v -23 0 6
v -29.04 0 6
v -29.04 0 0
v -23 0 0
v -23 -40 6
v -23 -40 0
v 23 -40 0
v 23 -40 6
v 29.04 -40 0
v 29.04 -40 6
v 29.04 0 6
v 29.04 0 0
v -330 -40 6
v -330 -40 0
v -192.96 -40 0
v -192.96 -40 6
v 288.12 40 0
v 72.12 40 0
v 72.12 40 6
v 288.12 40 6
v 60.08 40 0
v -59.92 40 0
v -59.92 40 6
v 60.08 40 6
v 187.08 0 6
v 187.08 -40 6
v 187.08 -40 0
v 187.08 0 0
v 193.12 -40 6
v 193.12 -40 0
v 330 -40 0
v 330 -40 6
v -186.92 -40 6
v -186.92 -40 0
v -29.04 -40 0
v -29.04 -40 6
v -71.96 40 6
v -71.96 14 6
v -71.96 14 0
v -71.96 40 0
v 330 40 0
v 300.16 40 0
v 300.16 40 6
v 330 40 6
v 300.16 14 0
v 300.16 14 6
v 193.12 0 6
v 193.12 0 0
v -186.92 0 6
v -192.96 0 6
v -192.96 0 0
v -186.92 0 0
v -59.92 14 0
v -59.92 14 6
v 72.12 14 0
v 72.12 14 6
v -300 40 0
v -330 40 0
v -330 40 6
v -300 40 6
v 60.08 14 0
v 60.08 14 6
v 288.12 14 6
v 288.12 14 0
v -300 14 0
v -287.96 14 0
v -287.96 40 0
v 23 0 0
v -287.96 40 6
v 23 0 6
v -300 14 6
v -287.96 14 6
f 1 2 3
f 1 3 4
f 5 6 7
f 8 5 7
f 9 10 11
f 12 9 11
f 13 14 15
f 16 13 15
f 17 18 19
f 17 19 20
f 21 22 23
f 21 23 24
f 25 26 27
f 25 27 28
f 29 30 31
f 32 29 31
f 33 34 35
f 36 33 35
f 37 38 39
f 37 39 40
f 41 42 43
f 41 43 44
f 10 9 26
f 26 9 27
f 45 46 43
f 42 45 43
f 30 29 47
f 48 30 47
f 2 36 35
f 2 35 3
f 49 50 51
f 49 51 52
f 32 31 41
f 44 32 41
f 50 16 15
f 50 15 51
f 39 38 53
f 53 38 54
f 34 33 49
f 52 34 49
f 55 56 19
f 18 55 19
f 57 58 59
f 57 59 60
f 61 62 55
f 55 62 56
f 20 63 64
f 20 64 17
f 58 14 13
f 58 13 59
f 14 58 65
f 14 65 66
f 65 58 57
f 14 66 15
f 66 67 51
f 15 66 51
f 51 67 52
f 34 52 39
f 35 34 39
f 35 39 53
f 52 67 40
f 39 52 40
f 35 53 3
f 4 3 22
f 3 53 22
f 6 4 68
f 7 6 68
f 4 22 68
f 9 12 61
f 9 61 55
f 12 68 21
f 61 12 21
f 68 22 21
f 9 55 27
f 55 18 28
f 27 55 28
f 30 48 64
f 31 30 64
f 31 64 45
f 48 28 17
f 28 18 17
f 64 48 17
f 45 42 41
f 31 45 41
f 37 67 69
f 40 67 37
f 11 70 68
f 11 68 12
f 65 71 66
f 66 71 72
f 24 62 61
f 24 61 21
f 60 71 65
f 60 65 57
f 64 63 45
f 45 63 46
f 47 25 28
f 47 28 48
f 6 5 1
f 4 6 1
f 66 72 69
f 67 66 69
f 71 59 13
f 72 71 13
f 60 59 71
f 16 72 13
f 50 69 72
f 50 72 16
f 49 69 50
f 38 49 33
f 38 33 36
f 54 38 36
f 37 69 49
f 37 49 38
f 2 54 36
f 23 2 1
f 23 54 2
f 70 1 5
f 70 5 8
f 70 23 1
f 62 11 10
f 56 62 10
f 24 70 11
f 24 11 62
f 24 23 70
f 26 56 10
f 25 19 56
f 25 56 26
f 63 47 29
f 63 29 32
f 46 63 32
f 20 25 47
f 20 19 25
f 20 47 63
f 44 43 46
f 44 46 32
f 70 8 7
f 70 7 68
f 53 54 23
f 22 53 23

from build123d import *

# Parameters (mm, degrees)
SKETCH1_W           = 660
SKETCH1_H           = 80
BOSS_EXTRUDE1_DEPTH = 6
SKETCH2_W           = 12.04
SKETCH2_H           = 26
CUT_EXTRUDE1_DEPTH  = 333.469547478
SKETCH3_W           = 6.04
SKETCH3_H           = 40
CUT_EXTRUDE2_DEPTH  = 333.469547478
SKETCH4_W           = 6.04
SKETCH4_H           = 40
CUT_EXTRUDE3_DEPTH  = 333.469547478


with BuildPart() as part:
    # Sketch1 → Boss-Extrude1 (new body)
    with BuildSketch(Plane.XY):
        Rectangle(SKETCH1_W, SKETCH1_H)
    extrude(amount=BOSS_EXTRUDE1_DEPTH)

    # Sketch2 → Cut-Extrude1 (cut, through all)
    with BuildSketch(Plane.XY.offset(6)):
        with Locations((-293.98, 27)):
            Rectangle(SKETCH2_W, SKETCH2_H)
        with Locations((-65.94, 27)):
            Rectangle(SKETCH2_W, SKETCH2_H)
        with Locations((66.1, 27)):
            Rectangle(SKETCH2_W, SKETCH2_H)
        with Locations((294.14, 27)):
            Rectangle(SKETCH2_W, SKETCH2_H)
    extrude(amount=-CUT_EXTRUDE1_DEPTH, mode=Mode.SUBTRACT)

    # Sketch3 → Cut-Extrude2 (cut, through all)
    with BuildSketch(Plane.XY.offset(6)):
        with Locations((-26.02, -20)):
            Rectangle(SKETCH3_W, SKETCH3_H)
        with Locations((26.02, -20)):
            Rectangle(SKETCH3_W, SKETCH3_H)
    extrude(amount=-CUT_EXTRUDE2_DEPTH, mode=Mode.SUBTRACT)

    # Sketch4 → Cut-Extrude3 (cut, through all)
    with BuildSketch(Plane.XY.offset(6)):
        with Locations((-189.94, -20)):
            Rectangle(SKETCH4_W, SKETCH4_H)
        with Locations((190.1, -20)):
            Rectangle(SKETCH4_W, SKETCH4_H)
    extrude(amount=-CUT_EXTRUDE3_DEPTH, mode=Mode.SUBTRACT)


solid = part.part
